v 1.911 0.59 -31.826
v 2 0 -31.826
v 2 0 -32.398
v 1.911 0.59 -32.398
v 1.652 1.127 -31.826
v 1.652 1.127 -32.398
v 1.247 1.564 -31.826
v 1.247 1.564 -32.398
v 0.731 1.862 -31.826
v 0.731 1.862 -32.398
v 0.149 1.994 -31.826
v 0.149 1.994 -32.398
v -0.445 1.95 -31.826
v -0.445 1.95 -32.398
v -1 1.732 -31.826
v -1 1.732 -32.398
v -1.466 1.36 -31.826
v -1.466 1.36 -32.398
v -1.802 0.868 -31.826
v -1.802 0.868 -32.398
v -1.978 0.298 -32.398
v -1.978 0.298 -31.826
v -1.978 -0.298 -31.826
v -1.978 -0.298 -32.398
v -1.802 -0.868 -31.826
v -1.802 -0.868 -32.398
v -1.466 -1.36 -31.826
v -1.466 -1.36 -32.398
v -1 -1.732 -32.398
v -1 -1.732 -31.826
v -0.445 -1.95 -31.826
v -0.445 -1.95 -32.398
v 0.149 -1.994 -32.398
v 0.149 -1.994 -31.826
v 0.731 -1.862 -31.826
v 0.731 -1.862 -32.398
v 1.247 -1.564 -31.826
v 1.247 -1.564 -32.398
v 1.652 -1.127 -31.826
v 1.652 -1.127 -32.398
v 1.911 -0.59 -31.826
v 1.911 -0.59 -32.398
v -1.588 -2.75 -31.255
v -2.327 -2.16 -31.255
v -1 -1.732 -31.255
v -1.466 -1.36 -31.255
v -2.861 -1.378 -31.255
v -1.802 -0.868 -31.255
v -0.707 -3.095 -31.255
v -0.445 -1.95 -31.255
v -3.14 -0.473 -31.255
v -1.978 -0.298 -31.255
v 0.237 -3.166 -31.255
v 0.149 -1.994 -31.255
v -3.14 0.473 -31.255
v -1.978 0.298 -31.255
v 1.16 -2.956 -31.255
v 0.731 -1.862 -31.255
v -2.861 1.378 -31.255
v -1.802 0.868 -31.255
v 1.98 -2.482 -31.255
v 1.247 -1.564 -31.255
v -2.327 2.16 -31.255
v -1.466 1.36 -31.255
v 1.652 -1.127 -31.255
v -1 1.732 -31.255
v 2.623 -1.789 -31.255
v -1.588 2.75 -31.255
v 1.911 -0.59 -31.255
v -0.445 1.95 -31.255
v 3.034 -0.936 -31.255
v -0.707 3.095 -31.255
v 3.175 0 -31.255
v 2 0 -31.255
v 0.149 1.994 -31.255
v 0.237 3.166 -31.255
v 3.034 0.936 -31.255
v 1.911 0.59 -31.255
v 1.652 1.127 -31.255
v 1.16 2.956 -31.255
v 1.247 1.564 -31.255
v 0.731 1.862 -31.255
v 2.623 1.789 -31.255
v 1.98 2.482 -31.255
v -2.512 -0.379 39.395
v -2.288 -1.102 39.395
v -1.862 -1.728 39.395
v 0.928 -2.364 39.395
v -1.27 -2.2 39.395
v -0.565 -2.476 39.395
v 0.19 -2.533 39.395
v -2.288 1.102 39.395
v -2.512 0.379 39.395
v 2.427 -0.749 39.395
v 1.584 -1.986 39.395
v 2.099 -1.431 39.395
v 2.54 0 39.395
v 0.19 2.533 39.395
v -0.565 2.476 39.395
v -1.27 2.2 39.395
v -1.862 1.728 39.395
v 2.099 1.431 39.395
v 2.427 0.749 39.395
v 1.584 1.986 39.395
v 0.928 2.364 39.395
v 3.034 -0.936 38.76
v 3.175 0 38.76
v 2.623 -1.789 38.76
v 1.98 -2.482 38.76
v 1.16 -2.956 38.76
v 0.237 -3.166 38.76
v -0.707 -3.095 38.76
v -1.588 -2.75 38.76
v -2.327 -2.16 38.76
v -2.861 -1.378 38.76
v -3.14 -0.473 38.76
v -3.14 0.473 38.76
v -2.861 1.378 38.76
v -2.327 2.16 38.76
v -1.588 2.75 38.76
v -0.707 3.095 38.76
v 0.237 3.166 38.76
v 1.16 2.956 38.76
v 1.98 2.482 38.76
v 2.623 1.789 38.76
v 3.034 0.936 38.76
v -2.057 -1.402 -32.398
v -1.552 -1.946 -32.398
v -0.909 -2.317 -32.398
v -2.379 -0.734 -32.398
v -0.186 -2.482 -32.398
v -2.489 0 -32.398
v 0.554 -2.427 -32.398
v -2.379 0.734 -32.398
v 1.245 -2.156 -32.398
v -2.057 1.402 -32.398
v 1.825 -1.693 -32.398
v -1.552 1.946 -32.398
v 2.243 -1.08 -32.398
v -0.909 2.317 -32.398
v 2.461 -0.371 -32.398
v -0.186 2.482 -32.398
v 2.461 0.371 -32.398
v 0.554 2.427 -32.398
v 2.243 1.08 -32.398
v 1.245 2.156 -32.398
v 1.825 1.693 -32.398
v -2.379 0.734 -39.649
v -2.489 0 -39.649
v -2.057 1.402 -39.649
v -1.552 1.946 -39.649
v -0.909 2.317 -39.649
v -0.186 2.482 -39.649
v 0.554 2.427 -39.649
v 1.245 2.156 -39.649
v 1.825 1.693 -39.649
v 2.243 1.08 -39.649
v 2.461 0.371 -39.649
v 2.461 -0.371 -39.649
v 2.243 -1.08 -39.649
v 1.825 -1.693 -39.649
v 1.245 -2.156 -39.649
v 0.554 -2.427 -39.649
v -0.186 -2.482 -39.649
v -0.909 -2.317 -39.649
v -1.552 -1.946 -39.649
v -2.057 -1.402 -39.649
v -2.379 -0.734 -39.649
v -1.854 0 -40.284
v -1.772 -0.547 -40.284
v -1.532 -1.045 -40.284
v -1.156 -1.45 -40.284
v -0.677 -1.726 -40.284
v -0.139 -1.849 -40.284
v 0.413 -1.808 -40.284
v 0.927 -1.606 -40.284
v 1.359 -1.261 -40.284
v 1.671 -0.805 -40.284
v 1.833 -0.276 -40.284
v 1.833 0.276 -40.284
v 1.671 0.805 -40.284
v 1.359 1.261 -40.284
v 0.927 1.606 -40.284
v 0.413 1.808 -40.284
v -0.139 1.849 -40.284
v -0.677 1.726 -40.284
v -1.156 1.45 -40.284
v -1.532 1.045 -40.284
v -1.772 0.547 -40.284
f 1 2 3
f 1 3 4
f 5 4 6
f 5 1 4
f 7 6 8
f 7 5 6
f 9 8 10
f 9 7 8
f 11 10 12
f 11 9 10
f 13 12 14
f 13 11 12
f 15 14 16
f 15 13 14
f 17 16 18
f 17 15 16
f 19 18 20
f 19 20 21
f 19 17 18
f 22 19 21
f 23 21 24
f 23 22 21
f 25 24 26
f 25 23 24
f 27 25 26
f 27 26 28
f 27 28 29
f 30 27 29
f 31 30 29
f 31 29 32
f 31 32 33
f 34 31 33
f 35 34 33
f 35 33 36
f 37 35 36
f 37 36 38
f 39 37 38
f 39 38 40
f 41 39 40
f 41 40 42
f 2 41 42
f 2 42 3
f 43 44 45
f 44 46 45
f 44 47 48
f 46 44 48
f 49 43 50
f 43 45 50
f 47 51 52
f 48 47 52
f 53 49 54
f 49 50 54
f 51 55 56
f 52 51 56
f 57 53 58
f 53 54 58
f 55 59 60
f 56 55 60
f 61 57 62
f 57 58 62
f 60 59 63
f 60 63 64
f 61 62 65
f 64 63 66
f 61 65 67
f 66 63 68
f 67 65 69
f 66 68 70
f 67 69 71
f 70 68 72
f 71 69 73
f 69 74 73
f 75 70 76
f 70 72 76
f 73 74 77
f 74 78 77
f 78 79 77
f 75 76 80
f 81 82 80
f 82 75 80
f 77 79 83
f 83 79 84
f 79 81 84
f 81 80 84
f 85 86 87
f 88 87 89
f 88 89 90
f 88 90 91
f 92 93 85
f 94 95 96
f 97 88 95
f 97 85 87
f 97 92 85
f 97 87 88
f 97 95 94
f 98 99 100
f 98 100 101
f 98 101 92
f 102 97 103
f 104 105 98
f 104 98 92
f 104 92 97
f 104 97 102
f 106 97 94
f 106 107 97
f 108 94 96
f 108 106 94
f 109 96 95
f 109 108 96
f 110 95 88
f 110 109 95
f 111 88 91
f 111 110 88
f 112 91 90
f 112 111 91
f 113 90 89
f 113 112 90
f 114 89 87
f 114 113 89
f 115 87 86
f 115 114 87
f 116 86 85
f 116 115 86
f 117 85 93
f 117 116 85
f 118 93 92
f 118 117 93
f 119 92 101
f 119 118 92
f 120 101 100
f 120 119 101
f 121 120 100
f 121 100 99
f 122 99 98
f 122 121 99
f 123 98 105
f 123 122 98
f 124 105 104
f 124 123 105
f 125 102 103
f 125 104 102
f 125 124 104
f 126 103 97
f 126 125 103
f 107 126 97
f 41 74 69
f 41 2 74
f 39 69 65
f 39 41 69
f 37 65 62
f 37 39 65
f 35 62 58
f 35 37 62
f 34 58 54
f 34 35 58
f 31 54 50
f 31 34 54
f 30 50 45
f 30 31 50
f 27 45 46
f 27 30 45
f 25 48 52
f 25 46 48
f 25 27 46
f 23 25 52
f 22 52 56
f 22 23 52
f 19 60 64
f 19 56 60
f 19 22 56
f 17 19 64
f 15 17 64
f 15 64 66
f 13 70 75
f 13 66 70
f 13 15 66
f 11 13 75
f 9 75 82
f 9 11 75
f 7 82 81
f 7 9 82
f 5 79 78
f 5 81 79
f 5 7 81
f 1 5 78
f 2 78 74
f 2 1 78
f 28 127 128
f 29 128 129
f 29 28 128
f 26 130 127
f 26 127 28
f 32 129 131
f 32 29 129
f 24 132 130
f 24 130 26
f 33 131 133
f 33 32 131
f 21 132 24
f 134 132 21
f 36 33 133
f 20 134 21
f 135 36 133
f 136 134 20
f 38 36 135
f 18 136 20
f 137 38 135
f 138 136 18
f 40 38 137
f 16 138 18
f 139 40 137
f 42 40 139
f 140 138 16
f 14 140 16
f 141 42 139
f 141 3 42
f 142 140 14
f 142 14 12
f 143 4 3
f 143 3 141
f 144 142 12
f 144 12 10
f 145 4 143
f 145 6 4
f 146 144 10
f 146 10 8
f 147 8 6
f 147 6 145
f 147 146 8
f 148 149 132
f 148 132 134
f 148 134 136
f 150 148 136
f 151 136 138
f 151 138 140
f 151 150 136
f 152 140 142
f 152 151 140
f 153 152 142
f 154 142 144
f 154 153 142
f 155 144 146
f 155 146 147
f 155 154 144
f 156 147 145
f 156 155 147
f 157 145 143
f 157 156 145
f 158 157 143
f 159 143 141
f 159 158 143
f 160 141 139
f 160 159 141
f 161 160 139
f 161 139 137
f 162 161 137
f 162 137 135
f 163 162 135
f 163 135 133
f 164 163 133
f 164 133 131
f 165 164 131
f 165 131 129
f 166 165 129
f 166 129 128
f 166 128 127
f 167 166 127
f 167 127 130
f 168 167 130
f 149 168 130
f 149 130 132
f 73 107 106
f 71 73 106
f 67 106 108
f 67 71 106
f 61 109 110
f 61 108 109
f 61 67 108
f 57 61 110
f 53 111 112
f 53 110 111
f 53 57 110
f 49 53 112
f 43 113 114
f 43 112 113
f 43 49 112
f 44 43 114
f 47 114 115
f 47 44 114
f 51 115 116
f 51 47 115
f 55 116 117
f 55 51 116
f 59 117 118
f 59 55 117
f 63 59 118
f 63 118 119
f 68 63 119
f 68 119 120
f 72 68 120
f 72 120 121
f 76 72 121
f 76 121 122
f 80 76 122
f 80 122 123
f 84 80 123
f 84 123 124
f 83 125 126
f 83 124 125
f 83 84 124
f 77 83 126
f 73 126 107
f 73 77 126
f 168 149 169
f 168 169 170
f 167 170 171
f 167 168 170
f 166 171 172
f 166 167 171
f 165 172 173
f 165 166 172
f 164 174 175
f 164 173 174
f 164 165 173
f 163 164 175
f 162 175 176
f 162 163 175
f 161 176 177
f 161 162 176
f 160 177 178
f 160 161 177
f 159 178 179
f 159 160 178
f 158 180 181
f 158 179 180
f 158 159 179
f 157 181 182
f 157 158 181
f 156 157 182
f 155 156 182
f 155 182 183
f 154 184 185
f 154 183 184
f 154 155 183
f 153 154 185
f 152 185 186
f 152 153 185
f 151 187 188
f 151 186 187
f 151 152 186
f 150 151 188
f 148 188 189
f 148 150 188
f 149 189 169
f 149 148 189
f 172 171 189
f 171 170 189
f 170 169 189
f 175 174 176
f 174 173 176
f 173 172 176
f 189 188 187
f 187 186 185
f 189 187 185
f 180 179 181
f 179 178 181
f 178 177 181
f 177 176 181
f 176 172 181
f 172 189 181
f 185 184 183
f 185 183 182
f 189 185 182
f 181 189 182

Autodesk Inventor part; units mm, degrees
sketch "Sketch1" plane through (0, 0, 0) normal (0, 0, 1) x (1, 0, 0)
  circle A0 centre (0, 0) radius 3.175
  dimension "d0" = 6.35
extrude "Extrusion1" add sketch "Sketch1" along normal blind 39.3954 and the other way blind 40.2844
ref_plane "Work Plane1" through (0, 0, -31.8262) normal (0, 0, 1) x (1, 0, 0)
sketch "Sketch2" plane through (0, 0, -31.8262) normal (0, 0, 1) x (1, 0, 0)
  circle A0 centre (0, 0) radius 2
  circle A1 centre (0, 0) radius 3.27
  dimension "d9" = 4
  dimension "d10" = 1.27
extrude "Extrusion2" cut sketch "Sketch2" along normal mid plane 1.143
sketch "Sketch3" plane through (0, 0, -40.2844) normal (0, 0, -1) x (-1, 0, 0)
  circle A0 centre (0, 0) radius 3.175 projected
  circle A1 centre (0, 0) radius 3.175
  circle A2 centre (0, 0) radius 2.4892
  dimension "d13" = 4.9784
  dimension "d14" = 0
extrude "Extrusion3" cut sketch "Sketch3" against normal up to next
chamfer "Chamfer1" distance 0.635 angle 45 2 edges at (-3.175, 0, 39.3954) (2.4892, 0, -40.2844)
properties part number "J005526" material "ALUMINUM, 2024-T4/T351"
